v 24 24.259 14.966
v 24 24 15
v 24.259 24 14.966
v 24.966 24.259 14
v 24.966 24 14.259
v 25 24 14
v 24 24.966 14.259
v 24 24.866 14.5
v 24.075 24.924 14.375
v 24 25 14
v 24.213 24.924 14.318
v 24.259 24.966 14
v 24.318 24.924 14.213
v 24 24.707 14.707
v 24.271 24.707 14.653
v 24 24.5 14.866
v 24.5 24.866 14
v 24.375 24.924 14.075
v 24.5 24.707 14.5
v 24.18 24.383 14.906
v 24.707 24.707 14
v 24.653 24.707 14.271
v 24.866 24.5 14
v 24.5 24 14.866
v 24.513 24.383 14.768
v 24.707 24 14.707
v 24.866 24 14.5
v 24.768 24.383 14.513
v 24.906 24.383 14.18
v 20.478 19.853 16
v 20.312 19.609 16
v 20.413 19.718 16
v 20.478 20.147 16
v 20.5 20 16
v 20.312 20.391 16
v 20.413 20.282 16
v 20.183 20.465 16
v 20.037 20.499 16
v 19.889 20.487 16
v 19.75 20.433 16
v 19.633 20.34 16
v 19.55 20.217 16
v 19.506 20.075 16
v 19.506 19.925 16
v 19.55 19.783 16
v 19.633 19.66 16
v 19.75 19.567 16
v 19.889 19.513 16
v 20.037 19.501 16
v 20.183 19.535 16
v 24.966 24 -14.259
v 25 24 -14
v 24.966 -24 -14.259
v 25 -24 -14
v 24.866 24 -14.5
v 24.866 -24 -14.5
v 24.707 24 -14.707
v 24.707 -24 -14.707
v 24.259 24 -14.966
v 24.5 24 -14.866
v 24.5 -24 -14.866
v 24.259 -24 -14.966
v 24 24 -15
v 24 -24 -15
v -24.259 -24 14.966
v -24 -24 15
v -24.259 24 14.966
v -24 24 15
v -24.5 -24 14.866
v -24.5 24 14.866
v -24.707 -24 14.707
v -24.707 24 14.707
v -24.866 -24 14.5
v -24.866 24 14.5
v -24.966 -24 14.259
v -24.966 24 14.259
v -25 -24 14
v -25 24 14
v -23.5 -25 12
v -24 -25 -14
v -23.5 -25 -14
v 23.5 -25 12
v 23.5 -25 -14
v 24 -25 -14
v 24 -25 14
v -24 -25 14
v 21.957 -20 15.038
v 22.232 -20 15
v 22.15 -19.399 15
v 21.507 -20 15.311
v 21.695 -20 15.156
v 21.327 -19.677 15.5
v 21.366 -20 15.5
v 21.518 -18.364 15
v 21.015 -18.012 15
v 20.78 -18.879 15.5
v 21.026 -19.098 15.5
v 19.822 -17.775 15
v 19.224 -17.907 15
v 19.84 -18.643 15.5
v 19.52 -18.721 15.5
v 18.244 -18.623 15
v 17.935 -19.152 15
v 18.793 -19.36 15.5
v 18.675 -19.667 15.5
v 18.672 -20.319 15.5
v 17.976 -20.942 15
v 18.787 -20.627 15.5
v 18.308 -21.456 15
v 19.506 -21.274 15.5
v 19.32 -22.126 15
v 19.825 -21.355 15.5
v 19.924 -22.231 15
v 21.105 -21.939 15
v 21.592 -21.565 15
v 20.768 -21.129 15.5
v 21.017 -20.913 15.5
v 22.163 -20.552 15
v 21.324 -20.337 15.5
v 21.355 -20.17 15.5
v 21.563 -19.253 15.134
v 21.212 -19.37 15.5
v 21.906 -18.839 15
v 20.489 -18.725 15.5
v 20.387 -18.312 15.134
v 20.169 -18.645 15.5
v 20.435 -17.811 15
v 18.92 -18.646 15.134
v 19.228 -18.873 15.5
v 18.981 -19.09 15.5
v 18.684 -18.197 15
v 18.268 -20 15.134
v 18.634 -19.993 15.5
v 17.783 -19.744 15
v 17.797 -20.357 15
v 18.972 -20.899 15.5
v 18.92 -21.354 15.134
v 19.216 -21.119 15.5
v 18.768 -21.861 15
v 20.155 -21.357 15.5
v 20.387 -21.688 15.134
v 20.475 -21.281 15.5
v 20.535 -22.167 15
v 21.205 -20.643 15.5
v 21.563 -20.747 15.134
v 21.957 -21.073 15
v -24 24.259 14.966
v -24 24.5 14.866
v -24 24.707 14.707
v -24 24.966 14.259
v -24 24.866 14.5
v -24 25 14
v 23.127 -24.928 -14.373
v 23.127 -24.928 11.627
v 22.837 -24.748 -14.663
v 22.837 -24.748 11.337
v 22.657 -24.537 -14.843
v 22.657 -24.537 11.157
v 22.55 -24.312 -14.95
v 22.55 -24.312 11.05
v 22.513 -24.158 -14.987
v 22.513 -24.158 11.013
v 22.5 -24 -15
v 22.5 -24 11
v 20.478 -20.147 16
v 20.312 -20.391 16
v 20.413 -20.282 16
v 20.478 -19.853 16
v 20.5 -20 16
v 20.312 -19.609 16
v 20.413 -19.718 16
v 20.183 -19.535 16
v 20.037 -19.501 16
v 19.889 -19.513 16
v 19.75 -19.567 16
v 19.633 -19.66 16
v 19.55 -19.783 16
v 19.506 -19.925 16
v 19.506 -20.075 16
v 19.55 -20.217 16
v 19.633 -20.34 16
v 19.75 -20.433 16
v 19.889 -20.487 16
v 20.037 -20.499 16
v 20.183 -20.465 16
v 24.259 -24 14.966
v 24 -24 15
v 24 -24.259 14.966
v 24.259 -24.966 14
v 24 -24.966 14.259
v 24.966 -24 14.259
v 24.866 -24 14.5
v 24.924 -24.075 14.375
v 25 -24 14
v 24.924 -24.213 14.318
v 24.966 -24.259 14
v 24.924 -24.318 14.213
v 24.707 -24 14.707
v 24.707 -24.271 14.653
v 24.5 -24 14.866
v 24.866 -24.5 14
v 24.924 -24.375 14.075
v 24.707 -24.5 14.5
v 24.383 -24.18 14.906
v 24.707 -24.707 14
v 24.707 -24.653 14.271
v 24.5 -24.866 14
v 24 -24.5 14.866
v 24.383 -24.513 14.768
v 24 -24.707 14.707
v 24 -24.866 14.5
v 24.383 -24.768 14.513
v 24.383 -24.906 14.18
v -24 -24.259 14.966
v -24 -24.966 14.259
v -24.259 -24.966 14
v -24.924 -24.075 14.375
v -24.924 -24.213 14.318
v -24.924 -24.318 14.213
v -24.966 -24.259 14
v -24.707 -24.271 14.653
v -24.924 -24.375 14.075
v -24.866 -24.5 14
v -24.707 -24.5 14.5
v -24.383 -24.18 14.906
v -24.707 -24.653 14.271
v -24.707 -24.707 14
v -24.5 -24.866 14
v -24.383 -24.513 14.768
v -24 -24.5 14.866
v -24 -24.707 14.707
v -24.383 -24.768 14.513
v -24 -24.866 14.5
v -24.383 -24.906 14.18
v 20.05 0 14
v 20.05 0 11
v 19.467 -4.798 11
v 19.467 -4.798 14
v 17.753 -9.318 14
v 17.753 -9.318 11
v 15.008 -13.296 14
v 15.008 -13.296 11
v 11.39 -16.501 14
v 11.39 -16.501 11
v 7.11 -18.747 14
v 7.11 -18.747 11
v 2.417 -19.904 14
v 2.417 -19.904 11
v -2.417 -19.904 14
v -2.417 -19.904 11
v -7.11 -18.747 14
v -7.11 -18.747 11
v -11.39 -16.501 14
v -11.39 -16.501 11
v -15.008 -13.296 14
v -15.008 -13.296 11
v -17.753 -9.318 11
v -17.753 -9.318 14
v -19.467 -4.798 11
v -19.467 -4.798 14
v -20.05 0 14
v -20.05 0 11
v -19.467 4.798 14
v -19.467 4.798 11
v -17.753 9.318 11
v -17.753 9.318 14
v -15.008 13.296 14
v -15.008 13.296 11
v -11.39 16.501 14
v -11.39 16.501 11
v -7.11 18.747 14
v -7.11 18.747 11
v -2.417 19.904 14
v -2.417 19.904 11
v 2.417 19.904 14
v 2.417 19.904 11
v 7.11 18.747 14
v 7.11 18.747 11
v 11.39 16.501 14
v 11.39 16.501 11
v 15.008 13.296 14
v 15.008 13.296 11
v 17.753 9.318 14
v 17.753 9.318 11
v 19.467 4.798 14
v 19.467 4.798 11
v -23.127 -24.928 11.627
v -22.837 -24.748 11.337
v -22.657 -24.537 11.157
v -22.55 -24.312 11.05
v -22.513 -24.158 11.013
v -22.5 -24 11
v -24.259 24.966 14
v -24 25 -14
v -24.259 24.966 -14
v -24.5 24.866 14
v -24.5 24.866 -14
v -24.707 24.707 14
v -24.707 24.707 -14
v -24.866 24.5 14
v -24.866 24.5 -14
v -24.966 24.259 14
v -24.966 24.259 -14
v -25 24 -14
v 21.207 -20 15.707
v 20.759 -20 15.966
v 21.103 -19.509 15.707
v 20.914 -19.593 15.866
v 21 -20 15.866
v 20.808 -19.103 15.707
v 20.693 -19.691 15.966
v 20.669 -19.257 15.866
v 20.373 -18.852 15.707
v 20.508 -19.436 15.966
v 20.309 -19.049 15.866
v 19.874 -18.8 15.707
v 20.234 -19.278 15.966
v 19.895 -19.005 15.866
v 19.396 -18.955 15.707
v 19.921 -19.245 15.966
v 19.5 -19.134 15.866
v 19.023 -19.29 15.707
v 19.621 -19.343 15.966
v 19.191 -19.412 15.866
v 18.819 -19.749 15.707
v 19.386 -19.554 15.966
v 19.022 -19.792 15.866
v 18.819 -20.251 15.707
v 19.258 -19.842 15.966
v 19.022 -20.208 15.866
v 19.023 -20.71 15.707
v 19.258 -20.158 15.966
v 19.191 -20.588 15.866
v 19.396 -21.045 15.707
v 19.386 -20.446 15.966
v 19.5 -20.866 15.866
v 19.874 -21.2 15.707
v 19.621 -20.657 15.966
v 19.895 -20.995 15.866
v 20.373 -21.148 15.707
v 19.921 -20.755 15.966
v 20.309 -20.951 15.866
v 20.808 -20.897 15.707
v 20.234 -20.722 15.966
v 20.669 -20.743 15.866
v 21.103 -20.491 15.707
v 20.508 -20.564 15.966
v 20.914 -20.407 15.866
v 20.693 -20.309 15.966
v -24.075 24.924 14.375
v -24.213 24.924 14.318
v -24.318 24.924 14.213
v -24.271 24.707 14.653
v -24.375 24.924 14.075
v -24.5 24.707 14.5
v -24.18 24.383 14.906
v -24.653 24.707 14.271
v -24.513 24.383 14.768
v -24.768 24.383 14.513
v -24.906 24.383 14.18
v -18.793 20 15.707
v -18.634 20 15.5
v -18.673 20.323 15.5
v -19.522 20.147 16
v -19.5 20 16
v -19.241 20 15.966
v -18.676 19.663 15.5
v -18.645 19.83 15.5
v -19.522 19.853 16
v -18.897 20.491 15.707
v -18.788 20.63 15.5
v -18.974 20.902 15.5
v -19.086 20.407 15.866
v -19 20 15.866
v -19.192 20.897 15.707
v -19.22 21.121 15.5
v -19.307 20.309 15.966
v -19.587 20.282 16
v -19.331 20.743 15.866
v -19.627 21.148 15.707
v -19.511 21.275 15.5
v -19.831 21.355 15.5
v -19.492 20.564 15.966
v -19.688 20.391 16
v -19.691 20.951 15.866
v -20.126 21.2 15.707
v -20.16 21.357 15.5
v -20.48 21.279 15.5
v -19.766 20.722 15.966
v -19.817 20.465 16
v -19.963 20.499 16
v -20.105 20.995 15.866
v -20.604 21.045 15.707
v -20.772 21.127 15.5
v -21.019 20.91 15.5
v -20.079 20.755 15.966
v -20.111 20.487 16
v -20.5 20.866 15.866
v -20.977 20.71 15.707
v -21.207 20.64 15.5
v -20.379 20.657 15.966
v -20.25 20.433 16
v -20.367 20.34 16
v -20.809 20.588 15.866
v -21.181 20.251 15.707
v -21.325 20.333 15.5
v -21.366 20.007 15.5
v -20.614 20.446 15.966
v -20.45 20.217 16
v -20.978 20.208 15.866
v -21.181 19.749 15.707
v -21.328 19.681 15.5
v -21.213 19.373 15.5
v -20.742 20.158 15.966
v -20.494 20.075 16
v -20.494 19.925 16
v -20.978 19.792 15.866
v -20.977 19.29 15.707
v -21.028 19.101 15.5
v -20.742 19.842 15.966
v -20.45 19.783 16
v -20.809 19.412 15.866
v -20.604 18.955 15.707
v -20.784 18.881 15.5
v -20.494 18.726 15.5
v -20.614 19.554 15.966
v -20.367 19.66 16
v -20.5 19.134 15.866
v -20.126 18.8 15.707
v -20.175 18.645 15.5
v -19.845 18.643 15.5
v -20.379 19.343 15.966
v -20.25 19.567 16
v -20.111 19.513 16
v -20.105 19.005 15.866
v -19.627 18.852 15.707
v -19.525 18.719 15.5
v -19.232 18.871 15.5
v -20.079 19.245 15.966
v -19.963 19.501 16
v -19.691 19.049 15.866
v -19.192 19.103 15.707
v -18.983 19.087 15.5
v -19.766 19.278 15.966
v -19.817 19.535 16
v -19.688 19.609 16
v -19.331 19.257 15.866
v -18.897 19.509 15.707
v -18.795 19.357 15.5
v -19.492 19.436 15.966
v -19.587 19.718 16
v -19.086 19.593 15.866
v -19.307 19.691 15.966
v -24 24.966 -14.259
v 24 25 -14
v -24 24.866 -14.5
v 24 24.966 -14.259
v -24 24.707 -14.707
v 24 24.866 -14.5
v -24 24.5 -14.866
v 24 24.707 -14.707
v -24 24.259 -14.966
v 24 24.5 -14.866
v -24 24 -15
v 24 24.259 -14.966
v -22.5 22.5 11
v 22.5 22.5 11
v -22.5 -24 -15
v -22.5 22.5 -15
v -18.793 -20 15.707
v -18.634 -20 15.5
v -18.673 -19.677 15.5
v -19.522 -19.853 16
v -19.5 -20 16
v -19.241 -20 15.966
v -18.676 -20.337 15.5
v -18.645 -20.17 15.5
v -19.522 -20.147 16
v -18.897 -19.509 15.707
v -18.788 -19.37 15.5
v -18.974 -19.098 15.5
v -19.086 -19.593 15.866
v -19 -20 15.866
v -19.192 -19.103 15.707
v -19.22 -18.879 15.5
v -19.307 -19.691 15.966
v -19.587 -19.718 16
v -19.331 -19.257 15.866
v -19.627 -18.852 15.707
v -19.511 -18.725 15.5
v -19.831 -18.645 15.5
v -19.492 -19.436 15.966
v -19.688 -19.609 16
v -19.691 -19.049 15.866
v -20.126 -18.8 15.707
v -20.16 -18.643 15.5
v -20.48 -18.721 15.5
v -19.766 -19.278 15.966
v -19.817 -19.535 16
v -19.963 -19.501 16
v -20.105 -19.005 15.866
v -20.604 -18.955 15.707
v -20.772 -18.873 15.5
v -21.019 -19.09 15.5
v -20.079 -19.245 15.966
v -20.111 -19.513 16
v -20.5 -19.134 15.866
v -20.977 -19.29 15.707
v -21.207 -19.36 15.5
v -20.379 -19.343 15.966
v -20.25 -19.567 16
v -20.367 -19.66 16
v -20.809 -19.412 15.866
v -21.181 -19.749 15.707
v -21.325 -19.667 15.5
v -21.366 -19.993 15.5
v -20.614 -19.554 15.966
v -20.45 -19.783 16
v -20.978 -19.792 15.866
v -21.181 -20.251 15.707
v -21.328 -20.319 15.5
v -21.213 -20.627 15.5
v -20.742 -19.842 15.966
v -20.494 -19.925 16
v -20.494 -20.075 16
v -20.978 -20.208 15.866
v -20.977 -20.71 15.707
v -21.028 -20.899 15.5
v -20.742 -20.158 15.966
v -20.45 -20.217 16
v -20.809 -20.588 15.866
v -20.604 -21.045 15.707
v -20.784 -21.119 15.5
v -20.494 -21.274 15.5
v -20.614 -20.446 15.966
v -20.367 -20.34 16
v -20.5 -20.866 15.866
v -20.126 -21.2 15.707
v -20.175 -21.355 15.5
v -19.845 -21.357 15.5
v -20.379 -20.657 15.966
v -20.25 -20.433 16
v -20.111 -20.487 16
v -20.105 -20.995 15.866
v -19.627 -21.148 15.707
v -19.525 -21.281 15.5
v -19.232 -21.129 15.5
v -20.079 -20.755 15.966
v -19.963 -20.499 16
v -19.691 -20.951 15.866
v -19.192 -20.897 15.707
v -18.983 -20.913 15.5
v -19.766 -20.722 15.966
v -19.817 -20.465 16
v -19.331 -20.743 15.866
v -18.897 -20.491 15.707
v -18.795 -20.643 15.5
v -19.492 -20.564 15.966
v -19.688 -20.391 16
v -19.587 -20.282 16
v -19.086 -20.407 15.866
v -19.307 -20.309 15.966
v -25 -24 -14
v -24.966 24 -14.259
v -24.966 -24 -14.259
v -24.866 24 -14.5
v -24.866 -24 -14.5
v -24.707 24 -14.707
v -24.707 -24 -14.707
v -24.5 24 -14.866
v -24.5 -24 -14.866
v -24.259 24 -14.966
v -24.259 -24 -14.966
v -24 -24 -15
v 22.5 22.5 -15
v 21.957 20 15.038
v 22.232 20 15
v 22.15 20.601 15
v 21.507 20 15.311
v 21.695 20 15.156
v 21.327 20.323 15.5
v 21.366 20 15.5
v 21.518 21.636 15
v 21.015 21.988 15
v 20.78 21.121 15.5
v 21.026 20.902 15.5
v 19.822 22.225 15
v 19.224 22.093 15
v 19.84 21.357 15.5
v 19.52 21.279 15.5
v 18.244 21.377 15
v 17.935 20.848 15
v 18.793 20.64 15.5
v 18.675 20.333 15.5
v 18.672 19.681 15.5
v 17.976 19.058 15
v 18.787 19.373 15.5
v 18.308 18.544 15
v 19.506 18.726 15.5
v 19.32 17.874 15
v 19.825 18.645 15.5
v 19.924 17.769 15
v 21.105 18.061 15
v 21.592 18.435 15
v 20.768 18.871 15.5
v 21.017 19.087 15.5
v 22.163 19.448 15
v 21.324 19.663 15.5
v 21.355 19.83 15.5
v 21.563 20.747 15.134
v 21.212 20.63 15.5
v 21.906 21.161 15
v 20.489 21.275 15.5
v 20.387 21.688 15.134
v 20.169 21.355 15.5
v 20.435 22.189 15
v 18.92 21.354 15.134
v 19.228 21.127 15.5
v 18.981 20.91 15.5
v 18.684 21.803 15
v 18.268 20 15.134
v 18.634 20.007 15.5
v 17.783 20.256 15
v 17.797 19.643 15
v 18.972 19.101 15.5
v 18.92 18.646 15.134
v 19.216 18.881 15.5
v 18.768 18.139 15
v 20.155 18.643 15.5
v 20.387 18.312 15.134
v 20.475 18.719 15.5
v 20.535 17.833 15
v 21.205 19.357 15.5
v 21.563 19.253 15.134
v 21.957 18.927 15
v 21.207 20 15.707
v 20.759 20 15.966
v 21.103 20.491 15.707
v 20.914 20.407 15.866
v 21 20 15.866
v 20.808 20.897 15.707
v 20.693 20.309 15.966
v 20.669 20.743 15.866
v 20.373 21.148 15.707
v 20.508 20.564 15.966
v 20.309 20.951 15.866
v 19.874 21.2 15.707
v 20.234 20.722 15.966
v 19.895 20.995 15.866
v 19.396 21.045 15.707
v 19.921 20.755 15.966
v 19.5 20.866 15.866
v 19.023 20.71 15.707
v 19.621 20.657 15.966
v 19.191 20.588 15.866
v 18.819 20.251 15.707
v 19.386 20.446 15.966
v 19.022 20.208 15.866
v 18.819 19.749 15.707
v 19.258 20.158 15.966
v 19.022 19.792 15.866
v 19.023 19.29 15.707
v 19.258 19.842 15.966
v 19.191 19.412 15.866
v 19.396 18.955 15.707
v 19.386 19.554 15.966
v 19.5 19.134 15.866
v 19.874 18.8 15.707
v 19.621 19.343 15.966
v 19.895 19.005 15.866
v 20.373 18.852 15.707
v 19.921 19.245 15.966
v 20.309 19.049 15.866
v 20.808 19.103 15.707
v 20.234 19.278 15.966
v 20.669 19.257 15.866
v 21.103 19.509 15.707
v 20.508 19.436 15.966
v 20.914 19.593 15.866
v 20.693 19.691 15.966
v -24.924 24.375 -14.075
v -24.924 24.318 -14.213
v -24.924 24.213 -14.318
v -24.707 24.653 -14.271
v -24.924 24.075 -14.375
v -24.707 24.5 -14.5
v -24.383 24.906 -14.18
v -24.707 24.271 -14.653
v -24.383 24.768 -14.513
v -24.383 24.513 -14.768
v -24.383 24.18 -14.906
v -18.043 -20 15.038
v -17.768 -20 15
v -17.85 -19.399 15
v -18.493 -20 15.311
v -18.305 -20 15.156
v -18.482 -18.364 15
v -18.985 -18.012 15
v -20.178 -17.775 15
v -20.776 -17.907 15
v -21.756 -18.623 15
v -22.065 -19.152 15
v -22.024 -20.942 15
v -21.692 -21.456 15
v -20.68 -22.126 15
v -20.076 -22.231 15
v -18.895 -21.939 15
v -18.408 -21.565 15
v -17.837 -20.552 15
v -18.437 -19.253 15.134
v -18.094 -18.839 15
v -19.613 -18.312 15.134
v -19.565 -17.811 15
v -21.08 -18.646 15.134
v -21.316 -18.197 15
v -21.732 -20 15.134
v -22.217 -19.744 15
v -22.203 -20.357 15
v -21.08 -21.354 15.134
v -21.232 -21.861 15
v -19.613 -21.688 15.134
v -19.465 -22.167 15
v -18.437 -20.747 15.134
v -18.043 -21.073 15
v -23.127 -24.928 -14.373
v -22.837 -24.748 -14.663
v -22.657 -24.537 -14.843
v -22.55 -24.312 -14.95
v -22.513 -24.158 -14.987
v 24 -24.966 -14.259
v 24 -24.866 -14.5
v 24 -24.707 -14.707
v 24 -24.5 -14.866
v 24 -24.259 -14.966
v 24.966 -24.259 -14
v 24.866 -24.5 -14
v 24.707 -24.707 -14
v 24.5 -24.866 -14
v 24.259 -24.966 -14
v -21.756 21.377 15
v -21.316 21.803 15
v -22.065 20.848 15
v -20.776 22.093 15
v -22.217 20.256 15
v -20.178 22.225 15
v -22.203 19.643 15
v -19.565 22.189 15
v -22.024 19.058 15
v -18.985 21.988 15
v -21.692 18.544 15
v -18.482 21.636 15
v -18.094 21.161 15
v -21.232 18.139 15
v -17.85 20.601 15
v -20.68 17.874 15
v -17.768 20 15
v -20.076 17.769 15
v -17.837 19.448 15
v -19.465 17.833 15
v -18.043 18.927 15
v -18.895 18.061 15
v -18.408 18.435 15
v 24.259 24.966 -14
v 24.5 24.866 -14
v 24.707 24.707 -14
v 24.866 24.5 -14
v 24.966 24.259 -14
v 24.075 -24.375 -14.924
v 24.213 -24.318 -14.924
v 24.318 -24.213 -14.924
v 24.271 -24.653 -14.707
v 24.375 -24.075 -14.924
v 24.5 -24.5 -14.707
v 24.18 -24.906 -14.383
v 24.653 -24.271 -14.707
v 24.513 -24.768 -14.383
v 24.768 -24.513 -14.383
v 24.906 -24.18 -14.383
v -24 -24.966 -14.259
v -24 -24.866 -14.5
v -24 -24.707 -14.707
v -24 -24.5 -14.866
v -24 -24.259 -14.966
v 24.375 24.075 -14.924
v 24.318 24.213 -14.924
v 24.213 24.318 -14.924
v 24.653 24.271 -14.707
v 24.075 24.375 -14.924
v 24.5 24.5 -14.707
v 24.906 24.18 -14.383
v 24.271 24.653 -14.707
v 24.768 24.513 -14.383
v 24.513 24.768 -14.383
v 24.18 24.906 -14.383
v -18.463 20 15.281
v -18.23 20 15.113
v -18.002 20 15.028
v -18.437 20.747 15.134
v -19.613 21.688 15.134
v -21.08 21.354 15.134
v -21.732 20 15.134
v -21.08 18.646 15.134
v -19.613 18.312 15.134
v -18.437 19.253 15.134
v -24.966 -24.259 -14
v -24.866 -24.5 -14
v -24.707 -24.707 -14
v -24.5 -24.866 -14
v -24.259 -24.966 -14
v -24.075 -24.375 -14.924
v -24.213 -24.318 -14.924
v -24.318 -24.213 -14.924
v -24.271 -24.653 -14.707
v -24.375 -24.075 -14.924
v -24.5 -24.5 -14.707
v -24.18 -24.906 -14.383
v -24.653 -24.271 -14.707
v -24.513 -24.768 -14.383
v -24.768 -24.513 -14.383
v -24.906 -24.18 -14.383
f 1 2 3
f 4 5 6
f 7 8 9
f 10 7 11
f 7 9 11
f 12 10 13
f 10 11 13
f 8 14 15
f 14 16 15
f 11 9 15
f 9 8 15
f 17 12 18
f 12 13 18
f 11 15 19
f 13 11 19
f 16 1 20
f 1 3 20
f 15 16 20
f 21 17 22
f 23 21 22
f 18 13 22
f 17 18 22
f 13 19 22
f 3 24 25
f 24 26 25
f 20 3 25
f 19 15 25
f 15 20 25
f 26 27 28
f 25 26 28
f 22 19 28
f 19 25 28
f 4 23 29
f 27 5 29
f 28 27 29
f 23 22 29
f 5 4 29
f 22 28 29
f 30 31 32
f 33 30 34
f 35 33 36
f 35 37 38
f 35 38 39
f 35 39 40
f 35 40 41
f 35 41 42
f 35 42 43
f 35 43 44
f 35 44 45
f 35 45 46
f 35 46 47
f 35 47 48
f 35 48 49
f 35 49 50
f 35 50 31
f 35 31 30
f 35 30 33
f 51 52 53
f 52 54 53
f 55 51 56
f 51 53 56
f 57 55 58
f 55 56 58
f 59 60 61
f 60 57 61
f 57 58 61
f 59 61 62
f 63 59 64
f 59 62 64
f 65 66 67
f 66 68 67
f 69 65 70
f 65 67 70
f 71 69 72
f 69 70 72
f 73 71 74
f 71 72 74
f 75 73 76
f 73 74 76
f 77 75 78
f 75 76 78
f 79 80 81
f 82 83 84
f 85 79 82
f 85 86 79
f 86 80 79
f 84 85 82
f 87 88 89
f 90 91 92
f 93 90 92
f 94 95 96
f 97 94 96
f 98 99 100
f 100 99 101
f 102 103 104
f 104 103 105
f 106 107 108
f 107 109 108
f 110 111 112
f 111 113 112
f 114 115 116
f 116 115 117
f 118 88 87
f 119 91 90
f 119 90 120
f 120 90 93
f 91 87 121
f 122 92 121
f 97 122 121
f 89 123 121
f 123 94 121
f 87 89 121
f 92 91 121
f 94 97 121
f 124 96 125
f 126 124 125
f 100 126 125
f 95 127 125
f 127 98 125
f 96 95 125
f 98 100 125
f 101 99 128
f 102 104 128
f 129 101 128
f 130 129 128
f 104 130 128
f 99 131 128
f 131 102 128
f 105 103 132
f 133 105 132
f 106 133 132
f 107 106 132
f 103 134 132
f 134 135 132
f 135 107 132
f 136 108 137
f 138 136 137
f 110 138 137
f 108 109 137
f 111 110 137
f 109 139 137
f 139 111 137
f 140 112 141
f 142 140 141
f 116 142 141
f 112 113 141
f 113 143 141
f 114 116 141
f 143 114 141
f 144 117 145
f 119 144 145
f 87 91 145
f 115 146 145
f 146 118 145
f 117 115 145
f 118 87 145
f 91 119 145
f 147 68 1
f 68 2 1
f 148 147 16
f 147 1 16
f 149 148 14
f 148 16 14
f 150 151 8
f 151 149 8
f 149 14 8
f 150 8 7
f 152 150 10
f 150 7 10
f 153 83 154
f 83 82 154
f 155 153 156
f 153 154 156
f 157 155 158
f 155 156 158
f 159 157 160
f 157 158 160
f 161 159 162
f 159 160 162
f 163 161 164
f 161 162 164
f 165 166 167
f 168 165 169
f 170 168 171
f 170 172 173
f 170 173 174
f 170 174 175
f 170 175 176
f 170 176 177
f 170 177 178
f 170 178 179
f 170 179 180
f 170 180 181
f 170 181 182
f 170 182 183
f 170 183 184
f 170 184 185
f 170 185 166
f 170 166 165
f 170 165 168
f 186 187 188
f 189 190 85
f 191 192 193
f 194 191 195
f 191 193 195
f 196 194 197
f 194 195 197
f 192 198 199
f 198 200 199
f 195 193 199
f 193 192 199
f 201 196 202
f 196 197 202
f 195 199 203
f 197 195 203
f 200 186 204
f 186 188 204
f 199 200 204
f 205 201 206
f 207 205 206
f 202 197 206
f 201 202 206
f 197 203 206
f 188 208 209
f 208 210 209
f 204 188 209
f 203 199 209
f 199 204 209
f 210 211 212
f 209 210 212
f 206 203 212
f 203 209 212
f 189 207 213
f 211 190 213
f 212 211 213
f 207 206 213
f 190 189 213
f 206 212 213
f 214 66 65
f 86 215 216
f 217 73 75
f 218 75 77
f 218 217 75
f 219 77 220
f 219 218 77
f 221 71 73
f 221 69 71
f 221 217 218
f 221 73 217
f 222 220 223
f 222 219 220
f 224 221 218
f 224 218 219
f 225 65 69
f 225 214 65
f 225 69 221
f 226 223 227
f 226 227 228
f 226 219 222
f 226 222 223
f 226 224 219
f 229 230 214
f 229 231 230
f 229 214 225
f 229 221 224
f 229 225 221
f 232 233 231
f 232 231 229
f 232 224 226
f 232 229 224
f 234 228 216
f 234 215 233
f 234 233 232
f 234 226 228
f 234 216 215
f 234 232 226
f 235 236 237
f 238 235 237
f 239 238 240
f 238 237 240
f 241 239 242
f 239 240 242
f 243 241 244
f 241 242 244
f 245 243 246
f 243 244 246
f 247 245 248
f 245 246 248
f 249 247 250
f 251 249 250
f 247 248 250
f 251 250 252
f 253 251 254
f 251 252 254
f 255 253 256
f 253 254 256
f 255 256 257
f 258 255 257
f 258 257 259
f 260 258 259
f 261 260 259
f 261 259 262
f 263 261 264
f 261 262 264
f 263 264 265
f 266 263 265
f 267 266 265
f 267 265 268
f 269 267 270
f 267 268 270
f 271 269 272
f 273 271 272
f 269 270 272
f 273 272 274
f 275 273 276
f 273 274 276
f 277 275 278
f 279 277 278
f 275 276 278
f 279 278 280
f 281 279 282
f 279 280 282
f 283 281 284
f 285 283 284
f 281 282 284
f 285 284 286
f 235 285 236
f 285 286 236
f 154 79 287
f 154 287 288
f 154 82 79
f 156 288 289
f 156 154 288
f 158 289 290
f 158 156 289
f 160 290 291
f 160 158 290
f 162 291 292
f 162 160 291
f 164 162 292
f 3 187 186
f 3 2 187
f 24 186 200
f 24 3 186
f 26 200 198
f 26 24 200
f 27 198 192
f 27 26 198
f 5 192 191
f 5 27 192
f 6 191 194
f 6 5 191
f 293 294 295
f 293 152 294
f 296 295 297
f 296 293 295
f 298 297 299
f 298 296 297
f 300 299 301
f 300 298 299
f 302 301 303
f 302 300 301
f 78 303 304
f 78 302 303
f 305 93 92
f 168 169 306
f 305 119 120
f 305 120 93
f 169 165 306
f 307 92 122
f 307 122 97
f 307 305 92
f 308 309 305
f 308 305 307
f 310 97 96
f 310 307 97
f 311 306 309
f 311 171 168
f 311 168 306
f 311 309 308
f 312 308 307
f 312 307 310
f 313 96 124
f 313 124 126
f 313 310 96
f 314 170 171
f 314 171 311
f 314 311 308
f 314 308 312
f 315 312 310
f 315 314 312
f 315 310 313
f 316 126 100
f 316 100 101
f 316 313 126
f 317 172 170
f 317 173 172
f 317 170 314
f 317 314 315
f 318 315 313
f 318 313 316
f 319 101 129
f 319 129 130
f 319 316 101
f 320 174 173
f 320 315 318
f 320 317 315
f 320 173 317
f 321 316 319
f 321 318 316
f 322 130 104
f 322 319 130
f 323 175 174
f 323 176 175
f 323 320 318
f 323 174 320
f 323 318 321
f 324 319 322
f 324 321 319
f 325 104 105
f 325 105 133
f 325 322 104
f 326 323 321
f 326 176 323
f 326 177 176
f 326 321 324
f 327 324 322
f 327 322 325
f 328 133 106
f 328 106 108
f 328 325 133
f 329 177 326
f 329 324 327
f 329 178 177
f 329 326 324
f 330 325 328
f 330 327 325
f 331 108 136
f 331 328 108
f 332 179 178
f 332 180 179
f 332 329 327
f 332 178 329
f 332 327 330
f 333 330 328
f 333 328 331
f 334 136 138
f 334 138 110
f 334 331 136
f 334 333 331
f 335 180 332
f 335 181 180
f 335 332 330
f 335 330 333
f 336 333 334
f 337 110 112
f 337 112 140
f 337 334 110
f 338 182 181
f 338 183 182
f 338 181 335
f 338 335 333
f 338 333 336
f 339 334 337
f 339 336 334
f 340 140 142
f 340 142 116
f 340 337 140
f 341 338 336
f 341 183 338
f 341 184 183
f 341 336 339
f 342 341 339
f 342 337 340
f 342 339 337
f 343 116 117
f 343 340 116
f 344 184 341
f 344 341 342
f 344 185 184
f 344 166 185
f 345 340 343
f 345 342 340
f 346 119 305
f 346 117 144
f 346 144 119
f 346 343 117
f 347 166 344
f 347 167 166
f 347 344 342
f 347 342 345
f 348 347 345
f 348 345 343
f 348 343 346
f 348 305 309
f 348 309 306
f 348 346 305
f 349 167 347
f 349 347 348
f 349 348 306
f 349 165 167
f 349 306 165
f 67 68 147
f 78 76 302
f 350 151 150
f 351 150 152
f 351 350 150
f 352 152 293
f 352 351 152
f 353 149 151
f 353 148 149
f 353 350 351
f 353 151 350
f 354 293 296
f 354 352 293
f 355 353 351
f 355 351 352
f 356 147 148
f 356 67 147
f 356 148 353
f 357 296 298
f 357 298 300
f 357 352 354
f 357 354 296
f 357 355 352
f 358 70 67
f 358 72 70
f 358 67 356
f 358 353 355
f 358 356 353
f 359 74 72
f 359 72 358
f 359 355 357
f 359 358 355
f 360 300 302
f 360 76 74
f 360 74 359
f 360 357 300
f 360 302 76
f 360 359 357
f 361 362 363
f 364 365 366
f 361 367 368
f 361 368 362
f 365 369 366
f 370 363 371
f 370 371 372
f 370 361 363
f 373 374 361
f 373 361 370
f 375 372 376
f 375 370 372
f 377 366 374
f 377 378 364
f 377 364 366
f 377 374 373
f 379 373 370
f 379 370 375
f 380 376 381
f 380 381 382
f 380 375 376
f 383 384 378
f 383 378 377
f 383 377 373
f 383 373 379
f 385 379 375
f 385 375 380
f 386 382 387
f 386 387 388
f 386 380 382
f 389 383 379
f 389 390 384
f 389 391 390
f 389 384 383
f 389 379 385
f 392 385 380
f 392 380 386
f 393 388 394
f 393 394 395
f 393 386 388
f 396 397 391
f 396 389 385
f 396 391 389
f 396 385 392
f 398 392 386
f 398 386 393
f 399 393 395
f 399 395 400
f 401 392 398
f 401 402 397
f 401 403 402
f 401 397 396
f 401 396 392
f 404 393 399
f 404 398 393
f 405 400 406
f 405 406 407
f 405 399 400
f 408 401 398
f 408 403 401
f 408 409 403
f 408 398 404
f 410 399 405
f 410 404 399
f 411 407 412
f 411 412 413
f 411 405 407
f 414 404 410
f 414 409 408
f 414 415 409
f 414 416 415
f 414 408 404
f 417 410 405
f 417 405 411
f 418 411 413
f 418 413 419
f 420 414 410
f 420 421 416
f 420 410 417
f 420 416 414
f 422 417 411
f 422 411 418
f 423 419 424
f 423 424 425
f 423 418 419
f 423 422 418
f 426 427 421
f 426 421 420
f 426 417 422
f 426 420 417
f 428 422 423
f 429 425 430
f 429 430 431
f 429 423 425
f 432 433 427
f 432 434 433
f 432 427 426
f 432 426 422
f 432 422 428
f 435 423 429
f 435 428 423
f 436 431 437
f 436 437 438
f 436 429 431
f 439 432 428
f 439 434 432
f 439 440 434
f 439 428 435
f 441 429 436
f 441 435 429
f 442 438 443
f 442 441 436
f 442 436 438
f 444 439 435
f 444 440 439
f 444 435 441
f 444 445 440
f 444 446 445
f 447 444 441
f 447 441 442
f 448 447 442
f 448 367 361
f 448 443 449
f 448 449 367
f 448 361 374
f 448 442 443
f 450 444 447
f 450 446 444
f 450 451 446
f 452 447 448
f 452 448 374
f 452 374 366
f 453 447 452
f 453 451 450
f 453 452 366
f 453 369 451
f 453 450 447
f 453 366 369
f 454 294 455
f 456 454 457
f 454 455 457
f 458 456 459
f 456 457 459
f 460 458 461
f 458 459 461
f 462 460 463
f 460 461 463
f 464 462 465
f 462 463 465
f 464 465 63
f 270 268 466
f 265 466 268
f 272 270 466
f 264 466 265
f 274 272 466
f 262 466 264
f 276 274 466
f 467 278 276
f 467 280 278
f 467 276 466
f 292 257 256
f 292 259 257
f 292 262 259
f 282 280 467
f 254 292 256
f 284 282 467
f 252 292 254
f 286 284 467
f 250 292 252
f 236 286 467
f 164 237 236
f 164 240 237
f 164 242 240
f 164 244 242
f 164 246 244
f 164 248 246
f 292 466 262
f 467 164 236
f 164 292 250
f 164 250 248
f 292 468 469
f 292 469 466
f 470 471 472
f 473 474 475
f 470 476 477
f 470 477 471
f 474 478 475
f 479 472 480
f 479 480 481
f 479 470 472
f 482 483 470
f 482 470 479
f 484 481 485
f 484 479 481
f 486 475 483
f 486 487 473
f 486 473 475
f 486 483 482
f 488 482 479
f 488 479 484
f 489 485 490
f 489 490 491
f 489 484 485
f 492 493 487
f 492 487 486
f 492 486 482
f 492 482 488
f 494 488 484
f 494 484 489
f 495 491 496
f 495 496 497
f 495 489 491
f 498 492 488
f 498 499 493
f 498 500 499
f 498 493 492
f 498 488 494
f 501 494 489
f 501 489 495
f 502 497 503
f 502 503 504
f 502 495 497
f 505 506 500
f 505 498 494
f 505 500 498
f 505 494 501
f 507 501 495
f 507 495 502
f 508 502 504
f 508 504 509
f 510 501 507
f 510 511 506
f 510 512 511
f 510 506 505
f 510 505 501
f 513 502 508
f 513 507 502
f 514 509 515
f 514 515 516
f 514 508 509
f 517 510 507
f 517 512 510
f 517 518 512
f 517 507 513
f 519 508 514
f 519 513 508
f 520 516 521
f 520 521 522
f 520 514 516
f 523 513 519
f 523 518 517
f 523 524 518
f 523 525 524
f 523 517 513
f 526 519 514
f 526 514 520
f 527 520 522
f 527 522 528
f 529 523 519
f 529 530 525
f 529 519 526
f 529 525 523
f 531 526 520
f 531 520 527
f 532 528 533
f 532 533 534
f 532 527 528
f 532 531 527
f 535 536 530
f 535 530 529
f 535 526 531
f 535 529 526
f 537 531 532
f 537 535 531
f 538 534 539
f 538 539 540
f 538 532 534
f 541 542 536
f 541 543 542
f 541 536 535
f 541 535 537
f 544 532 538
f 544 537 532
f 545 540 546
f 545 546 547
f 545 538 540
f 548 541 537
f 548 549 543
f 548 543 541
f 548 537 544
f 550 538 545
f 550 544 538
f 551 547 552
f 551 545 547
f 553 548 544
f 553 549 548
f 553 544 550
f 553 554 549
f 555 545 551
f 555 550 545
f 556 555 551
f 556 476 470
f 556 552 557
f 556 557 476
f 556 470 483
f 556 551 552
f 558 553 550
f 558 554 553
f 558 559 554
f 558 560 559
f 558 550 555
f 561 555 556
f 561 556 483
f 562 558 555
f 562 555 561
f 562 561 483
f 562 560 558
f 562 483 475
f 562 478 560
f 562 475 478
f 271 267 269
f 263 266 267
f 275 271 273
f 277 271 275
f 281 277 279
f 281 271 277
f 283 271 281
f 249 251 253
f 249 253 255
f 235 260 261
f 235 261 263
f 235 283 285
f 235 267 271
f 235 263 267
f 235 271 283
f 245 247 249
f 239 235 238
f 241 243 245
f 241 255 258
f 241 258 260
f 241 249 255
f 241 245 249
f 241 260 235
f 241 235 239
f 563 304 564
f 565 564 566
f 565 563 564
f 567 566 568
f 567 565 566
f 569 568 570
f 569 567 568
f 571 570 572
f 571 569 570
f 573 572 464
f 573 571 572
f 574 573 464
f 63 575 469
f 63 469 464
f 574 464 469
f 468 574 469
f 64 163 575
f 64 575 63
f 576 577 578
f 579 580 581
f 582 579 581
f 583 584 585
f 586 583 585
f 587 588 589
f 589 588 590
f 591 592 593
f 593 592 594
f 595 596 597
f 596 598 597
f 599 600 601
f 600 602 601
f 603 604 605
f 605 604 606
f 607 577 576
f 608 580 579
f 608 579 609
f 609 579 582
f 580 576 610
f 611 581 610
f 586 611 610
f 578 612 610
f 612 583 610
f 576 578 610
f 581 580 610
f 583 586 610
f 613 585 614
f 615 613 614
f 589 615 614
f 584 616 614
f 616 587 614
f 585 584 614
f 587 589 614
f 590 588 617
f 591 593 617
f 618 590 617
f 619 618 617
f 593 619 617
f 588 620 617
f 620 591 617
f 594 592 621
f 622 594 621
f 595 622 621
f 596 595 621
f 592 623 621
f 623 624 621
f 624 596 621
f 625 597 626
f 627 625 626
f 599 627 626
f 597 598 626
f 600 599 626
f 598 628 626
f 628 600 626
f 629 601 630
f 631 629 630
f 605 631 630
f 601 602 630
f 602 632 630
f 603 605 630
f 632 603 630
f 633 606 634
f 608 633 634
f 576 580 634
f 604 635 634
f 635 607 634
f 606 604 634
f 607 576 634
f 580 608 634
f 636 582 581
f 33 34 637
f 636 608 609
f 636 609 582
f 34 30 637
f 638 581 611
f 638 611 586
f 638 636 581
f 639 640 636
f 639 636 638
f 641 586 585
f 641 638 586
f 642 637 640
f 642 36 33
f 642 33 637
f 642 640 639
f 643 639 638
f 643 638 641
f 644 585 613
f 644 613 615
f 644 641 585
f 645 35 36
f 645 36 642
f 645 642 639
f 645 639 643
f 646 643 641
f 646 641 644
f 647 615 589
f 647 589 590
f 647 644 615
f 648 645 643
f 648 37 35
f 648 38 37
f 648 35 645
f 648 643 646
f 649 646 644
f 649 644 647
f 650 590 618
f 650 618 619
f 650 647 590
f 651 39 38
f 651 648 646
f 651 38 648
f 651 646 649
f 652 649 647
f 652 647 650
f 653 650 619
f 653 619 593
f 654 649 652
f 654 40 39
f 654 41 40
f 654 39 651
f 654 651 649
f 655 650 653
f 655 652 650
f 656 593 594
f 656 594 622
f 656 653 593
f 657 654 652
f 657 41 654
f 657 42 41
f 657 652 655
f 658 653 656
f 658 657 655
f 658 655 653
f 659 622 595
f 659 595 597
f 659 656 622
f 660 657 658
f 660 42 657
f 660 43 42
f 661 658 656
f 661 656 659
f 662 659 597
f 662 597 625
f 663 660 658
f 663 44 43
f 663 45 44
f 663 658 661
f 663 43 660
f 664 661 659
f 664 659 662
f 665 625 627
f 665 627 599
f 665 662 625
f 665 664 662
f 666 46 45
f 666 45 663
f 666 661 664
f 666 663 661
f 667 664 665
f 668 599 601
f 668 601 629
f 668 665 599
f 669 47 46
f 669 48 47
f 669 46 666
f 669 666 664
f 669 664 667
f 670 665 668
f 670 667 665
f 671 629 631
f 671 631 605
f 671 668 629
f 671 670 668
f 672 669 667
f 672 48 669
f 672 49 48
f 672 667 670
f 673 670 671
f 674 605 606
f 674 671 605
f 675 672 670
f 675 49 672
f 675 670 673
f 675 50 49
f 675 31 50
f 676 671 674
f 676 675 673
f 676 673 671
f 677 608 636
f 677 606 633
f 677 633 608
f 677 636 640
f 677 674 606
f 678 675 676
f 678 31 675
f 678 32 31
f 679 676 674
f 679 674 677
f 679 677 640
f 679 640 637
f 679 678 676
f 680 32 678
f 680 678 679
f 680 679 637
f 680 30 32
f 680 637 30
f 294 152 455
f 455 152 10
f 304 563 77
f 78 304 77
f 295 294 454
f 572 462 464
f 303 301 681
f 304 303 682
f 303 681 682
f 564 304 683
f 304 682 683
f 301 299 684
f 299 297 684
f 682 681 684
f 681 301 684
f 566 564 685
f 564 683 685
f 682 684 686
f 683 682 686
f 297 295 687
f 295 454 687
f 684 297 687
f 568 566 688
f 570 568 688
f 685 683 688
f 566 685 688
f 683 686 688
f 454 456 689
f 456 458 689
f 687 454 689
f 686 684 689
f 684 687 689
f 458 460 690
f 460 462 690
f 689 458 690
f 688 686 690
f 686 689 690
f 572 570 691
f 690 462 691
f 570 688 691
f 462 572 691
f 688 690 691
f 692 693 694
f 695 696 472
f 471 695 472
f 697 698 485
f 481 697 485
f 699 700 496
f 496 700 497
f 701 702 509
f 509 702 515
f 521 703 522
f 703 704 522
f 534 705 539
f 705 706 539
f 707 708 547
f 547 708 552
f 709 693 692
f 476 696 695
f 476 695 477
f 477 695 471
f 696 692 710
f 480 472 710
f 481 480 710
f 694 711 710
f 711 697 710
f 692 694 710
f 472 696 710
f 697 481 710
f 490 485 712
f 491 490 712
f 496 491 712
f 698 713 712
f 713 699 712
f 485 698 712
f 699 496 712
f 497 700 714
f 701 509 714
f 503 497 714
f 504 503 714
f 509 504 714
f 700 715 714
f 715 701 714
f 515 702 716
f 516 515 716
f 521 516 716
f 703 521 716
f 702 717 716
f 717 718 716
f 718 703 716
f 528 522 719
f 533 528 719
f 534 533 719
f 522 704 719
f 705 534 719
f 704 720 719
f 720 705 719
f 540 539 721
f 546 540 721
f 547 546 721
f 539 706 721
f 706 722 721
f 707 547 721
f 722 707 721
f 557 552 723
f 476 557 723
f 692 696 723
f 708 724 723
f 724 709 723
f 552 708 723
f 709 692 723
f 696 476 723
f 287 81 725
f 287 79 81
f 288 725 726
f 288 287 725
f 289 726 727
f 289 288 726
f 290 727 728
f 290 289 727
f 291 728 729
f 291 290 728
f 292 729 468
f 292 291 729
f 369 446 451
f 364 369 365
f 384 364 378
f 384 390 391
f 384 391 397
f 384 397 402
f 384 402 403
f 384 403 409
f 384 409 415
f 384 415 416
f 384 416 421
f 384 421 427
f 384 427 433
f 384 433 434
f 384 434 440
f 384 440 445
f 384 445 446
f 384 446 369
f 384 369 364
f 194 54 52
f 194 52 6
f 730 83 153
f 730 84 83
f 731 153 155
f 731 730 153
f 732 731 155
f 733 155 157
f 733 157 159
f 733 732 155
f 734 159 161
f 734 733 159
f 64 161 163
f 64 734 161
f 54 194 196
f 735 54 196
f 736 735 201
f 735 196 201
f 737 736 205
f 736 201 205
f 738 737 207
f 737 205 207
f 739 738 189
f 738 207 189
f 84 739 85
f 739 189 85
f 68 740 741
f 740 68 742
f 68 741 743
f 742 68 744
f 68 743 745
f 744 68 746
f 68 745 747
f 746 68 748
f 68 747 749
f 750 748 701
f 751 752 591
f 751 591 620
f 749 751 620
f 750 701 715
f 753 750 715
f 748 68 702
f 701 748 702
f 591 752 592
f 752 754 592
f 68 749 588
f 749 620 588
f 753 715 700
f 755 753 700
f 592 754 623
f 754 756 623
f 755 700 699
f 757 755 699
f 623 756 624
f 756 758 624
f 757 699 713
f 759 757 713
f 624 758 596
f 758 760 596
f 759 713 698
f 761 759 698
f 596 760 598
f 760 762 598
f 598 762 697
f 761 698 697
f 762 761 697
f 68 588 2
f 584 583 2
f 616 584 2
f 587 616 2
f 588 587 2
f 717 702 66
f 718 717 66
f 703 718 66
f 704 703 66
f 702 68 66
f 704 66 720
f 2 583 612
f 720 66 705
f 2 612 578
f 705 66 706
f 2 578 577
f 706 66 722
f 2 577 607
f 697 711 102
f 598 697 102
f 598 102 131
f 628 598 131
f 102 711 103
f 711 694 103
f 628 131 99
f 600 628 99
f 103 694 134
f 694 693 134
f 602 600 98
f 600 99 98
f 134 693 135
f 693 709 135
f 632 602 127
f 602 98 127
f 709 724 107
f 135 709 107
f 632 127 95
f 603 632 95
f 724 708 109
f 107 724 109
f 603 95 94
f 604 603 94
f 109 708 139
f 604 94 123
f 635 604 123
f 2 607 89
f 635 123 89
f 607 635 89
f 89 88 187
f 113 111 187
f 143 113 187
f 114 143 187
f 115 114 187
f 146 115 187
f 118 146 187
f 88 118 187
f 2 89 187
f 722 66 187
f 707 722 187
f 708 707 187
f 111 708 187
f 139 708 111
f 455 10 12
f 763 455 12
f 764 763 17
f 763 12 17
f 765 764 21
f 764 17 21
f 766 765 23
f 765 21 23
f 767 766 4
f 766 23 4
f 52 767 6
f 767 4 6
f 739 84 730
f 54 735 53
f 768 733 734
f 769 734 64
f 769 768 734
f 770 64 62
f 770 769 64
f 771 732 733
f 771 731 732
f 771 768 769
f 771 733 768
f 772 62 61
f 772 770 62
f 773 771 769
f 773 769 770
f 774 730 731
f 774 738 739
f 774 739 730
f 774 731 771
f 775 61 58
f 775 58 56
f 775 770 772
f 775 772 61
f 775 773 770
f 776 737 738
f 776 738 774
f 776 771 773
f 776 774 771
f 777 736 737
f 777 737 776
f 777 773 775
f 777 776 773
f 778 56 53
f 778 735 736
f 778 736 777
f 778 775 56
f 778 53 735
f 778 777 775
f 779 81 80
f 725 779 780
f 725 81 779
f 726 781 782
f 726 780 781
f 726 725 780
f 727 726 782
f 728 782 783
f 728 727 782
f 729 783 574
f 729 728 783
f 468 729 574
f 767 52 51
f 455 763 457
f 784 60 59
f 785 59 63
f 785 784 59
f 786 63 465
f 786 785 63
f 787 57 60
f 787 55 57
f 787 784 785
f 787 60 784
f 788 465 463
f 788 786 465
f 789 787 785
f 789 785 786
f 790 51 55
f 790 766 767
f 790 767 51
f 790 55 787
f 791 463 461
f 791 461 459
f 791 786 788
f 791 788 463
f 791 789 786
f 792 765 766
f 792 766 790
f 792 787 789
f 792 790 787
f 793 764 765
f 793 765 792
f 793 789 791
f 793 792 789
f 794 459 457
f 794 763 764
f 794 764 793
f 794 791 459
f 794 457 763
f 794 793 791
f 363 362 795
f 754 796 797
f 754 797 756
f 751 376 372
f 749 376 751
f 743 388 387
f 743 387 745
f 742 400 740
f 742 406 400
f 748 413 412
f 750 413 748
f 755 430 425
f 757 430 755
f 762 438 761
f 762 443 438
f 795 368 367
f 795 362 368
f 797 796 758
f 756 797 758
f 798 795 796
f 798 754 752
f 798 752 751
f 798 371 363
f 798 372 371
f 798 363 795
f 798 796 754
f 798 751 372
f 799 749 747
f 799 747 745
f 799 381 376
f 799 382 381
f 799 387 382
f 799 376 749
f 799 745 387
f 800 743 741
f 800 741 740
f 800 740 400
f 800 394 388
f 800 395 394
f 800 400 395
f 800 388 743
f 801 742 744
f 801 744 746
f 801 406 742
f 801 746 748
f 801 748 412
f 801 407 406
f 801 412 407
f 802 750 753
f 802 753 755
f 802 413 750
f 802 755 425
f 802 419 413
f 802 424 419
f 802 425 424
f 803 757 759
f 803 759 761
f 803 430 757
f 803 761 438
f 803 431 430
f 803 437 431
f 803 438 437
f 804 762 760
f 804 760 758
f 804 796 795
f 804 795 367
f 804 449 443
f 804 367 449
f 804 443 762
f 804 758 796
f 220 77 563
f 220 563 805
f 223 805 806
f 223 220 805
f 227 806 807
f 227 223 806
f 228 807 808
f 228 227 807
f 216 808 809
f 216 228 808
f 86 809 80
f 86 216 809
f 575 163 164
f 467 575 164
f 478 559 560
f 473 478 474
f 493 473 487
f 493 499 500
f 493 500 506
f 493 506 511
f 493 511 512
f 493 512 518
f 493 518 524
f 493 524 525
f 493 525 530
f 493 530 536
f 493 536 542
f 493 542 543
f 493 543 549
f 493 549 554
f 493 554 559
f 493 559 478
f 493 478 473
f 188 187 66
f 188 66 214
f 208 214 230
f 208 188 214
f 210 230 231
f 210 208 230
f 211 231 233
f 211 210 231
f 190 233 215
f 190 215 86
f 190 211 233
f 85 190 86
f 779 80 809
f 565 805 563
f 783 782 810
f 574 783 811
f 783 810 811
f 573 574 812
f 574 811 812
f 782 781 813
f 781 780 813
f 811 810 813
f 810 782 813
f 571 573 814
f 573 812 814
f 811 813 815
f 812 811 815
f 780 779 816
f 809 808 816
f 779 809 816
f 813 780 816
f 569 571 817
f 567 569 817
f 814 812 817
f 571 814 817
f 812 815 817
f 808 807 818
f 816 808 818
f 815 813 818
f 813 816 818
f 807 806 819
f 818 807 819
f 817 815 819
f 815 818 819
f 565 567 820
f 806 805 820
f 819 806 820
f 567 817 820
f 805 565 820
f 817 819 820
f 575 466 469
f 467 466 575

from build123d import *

# Parameters (mm, degrees)
F0_W          = 50
F0_H          = 30
F1_DEPTH      = 25
F1_DEPTH_BACK = 25
F2_W          = 45
F2_H          = 26
F3_DEPTH      = 47.5
F4_R          = 20.05
F5_DEPTH      = 3
F6_R          = 1.5
F7_DEPTH      = 1
F8_R          = 0.99999
F9_R          = 1


# Not quite as in the source:
# - a fillet or chamfer is up to 0.001 mm smaller than in the source, because OpenCascade refuses the exact size


with BuildPart() as f1:
    # F0 (on Front) → F1 (new body, two sides)
    with BuildSketch(Plane.XZ) as f1_sk:
        Rectangle(F0_W, F0_H)
    extrude(amount=F1_DEPTH)
    extrude(f1_sk.sketch, amount=-F1_DEPTH_BACK)

    # F2 (on face) → F3 (cut)
    with BuildSketch(Plane.XZ.offset(25)):
        with Locations((0, -2)):
            Rectangle(F2_W, F2_H)
    extrude(amount=-F3_DEPTH, mode=Mode.SUBTRACT)

    # F4 (on face) → F5 (cut)
    with BuildSketch(Plane(origin=(0, 0, 11), x_dir=(1, 0, 0), z_dir=(0, 0, -1))):
        Circle(F4_R)
    extrude(amount=-F5_DEPTH, mode=Mode.SUBTRACT)

    # F6 (on face) → F7 (join)
    with BuildSketch(Plane.XY.offset(15)):
        with Locations((-20, 20)):
            Circle(F6_R)
        with Locations((20, 20)):
            Circle(F6_R)
        with Locations((20, -20)):
            Circle(F6_R)
        with Locations((-20, -20)):
            Circle(F6_R)
    extrude(amount=F7_DEPTH)

    # F8 (radius 1 in the source; OpenCascade refuses exactly that, so slightly less here)
    f8_edges = [f1.edges().sort_by_distance(p)[0] for p in [
        (-21.5, -20, 16),
        (18.5, -20, 16),
        (18.5, 20, 16),
        (-21.5, 20, 16),
    ]]
    fillet(f8_edges, radius=F8_R)

    # F9
    f9_edges = [f1.edges().sort_by_distance(p)[0] for p in [
        (0, -25, 15),
        (25, 0, 15),
        (-25, 0, 15),
        (0, 25, 15),
        (18.5, -20, 15),
        (-21.5, -20, 15),
        (18.5, 20, 15),
        (-21.5, 20, 15),
        (-25, -25, 0),
        (25, -25, 0),
        (23.75, -25, -15),
        (22.5, -25, -2),
        (0, -25, 11),
        (-22.5, -25, -2),
        (-23.75, -25, -15),
        (25, 25, 0),
        (25, 0, -15),
        (0, 25, -15),
        (-25, 25, 0),
        (-25, 0, -15),
    ]]
    fillet(f9_edges, radius=F9_R)


solid = f1.part
